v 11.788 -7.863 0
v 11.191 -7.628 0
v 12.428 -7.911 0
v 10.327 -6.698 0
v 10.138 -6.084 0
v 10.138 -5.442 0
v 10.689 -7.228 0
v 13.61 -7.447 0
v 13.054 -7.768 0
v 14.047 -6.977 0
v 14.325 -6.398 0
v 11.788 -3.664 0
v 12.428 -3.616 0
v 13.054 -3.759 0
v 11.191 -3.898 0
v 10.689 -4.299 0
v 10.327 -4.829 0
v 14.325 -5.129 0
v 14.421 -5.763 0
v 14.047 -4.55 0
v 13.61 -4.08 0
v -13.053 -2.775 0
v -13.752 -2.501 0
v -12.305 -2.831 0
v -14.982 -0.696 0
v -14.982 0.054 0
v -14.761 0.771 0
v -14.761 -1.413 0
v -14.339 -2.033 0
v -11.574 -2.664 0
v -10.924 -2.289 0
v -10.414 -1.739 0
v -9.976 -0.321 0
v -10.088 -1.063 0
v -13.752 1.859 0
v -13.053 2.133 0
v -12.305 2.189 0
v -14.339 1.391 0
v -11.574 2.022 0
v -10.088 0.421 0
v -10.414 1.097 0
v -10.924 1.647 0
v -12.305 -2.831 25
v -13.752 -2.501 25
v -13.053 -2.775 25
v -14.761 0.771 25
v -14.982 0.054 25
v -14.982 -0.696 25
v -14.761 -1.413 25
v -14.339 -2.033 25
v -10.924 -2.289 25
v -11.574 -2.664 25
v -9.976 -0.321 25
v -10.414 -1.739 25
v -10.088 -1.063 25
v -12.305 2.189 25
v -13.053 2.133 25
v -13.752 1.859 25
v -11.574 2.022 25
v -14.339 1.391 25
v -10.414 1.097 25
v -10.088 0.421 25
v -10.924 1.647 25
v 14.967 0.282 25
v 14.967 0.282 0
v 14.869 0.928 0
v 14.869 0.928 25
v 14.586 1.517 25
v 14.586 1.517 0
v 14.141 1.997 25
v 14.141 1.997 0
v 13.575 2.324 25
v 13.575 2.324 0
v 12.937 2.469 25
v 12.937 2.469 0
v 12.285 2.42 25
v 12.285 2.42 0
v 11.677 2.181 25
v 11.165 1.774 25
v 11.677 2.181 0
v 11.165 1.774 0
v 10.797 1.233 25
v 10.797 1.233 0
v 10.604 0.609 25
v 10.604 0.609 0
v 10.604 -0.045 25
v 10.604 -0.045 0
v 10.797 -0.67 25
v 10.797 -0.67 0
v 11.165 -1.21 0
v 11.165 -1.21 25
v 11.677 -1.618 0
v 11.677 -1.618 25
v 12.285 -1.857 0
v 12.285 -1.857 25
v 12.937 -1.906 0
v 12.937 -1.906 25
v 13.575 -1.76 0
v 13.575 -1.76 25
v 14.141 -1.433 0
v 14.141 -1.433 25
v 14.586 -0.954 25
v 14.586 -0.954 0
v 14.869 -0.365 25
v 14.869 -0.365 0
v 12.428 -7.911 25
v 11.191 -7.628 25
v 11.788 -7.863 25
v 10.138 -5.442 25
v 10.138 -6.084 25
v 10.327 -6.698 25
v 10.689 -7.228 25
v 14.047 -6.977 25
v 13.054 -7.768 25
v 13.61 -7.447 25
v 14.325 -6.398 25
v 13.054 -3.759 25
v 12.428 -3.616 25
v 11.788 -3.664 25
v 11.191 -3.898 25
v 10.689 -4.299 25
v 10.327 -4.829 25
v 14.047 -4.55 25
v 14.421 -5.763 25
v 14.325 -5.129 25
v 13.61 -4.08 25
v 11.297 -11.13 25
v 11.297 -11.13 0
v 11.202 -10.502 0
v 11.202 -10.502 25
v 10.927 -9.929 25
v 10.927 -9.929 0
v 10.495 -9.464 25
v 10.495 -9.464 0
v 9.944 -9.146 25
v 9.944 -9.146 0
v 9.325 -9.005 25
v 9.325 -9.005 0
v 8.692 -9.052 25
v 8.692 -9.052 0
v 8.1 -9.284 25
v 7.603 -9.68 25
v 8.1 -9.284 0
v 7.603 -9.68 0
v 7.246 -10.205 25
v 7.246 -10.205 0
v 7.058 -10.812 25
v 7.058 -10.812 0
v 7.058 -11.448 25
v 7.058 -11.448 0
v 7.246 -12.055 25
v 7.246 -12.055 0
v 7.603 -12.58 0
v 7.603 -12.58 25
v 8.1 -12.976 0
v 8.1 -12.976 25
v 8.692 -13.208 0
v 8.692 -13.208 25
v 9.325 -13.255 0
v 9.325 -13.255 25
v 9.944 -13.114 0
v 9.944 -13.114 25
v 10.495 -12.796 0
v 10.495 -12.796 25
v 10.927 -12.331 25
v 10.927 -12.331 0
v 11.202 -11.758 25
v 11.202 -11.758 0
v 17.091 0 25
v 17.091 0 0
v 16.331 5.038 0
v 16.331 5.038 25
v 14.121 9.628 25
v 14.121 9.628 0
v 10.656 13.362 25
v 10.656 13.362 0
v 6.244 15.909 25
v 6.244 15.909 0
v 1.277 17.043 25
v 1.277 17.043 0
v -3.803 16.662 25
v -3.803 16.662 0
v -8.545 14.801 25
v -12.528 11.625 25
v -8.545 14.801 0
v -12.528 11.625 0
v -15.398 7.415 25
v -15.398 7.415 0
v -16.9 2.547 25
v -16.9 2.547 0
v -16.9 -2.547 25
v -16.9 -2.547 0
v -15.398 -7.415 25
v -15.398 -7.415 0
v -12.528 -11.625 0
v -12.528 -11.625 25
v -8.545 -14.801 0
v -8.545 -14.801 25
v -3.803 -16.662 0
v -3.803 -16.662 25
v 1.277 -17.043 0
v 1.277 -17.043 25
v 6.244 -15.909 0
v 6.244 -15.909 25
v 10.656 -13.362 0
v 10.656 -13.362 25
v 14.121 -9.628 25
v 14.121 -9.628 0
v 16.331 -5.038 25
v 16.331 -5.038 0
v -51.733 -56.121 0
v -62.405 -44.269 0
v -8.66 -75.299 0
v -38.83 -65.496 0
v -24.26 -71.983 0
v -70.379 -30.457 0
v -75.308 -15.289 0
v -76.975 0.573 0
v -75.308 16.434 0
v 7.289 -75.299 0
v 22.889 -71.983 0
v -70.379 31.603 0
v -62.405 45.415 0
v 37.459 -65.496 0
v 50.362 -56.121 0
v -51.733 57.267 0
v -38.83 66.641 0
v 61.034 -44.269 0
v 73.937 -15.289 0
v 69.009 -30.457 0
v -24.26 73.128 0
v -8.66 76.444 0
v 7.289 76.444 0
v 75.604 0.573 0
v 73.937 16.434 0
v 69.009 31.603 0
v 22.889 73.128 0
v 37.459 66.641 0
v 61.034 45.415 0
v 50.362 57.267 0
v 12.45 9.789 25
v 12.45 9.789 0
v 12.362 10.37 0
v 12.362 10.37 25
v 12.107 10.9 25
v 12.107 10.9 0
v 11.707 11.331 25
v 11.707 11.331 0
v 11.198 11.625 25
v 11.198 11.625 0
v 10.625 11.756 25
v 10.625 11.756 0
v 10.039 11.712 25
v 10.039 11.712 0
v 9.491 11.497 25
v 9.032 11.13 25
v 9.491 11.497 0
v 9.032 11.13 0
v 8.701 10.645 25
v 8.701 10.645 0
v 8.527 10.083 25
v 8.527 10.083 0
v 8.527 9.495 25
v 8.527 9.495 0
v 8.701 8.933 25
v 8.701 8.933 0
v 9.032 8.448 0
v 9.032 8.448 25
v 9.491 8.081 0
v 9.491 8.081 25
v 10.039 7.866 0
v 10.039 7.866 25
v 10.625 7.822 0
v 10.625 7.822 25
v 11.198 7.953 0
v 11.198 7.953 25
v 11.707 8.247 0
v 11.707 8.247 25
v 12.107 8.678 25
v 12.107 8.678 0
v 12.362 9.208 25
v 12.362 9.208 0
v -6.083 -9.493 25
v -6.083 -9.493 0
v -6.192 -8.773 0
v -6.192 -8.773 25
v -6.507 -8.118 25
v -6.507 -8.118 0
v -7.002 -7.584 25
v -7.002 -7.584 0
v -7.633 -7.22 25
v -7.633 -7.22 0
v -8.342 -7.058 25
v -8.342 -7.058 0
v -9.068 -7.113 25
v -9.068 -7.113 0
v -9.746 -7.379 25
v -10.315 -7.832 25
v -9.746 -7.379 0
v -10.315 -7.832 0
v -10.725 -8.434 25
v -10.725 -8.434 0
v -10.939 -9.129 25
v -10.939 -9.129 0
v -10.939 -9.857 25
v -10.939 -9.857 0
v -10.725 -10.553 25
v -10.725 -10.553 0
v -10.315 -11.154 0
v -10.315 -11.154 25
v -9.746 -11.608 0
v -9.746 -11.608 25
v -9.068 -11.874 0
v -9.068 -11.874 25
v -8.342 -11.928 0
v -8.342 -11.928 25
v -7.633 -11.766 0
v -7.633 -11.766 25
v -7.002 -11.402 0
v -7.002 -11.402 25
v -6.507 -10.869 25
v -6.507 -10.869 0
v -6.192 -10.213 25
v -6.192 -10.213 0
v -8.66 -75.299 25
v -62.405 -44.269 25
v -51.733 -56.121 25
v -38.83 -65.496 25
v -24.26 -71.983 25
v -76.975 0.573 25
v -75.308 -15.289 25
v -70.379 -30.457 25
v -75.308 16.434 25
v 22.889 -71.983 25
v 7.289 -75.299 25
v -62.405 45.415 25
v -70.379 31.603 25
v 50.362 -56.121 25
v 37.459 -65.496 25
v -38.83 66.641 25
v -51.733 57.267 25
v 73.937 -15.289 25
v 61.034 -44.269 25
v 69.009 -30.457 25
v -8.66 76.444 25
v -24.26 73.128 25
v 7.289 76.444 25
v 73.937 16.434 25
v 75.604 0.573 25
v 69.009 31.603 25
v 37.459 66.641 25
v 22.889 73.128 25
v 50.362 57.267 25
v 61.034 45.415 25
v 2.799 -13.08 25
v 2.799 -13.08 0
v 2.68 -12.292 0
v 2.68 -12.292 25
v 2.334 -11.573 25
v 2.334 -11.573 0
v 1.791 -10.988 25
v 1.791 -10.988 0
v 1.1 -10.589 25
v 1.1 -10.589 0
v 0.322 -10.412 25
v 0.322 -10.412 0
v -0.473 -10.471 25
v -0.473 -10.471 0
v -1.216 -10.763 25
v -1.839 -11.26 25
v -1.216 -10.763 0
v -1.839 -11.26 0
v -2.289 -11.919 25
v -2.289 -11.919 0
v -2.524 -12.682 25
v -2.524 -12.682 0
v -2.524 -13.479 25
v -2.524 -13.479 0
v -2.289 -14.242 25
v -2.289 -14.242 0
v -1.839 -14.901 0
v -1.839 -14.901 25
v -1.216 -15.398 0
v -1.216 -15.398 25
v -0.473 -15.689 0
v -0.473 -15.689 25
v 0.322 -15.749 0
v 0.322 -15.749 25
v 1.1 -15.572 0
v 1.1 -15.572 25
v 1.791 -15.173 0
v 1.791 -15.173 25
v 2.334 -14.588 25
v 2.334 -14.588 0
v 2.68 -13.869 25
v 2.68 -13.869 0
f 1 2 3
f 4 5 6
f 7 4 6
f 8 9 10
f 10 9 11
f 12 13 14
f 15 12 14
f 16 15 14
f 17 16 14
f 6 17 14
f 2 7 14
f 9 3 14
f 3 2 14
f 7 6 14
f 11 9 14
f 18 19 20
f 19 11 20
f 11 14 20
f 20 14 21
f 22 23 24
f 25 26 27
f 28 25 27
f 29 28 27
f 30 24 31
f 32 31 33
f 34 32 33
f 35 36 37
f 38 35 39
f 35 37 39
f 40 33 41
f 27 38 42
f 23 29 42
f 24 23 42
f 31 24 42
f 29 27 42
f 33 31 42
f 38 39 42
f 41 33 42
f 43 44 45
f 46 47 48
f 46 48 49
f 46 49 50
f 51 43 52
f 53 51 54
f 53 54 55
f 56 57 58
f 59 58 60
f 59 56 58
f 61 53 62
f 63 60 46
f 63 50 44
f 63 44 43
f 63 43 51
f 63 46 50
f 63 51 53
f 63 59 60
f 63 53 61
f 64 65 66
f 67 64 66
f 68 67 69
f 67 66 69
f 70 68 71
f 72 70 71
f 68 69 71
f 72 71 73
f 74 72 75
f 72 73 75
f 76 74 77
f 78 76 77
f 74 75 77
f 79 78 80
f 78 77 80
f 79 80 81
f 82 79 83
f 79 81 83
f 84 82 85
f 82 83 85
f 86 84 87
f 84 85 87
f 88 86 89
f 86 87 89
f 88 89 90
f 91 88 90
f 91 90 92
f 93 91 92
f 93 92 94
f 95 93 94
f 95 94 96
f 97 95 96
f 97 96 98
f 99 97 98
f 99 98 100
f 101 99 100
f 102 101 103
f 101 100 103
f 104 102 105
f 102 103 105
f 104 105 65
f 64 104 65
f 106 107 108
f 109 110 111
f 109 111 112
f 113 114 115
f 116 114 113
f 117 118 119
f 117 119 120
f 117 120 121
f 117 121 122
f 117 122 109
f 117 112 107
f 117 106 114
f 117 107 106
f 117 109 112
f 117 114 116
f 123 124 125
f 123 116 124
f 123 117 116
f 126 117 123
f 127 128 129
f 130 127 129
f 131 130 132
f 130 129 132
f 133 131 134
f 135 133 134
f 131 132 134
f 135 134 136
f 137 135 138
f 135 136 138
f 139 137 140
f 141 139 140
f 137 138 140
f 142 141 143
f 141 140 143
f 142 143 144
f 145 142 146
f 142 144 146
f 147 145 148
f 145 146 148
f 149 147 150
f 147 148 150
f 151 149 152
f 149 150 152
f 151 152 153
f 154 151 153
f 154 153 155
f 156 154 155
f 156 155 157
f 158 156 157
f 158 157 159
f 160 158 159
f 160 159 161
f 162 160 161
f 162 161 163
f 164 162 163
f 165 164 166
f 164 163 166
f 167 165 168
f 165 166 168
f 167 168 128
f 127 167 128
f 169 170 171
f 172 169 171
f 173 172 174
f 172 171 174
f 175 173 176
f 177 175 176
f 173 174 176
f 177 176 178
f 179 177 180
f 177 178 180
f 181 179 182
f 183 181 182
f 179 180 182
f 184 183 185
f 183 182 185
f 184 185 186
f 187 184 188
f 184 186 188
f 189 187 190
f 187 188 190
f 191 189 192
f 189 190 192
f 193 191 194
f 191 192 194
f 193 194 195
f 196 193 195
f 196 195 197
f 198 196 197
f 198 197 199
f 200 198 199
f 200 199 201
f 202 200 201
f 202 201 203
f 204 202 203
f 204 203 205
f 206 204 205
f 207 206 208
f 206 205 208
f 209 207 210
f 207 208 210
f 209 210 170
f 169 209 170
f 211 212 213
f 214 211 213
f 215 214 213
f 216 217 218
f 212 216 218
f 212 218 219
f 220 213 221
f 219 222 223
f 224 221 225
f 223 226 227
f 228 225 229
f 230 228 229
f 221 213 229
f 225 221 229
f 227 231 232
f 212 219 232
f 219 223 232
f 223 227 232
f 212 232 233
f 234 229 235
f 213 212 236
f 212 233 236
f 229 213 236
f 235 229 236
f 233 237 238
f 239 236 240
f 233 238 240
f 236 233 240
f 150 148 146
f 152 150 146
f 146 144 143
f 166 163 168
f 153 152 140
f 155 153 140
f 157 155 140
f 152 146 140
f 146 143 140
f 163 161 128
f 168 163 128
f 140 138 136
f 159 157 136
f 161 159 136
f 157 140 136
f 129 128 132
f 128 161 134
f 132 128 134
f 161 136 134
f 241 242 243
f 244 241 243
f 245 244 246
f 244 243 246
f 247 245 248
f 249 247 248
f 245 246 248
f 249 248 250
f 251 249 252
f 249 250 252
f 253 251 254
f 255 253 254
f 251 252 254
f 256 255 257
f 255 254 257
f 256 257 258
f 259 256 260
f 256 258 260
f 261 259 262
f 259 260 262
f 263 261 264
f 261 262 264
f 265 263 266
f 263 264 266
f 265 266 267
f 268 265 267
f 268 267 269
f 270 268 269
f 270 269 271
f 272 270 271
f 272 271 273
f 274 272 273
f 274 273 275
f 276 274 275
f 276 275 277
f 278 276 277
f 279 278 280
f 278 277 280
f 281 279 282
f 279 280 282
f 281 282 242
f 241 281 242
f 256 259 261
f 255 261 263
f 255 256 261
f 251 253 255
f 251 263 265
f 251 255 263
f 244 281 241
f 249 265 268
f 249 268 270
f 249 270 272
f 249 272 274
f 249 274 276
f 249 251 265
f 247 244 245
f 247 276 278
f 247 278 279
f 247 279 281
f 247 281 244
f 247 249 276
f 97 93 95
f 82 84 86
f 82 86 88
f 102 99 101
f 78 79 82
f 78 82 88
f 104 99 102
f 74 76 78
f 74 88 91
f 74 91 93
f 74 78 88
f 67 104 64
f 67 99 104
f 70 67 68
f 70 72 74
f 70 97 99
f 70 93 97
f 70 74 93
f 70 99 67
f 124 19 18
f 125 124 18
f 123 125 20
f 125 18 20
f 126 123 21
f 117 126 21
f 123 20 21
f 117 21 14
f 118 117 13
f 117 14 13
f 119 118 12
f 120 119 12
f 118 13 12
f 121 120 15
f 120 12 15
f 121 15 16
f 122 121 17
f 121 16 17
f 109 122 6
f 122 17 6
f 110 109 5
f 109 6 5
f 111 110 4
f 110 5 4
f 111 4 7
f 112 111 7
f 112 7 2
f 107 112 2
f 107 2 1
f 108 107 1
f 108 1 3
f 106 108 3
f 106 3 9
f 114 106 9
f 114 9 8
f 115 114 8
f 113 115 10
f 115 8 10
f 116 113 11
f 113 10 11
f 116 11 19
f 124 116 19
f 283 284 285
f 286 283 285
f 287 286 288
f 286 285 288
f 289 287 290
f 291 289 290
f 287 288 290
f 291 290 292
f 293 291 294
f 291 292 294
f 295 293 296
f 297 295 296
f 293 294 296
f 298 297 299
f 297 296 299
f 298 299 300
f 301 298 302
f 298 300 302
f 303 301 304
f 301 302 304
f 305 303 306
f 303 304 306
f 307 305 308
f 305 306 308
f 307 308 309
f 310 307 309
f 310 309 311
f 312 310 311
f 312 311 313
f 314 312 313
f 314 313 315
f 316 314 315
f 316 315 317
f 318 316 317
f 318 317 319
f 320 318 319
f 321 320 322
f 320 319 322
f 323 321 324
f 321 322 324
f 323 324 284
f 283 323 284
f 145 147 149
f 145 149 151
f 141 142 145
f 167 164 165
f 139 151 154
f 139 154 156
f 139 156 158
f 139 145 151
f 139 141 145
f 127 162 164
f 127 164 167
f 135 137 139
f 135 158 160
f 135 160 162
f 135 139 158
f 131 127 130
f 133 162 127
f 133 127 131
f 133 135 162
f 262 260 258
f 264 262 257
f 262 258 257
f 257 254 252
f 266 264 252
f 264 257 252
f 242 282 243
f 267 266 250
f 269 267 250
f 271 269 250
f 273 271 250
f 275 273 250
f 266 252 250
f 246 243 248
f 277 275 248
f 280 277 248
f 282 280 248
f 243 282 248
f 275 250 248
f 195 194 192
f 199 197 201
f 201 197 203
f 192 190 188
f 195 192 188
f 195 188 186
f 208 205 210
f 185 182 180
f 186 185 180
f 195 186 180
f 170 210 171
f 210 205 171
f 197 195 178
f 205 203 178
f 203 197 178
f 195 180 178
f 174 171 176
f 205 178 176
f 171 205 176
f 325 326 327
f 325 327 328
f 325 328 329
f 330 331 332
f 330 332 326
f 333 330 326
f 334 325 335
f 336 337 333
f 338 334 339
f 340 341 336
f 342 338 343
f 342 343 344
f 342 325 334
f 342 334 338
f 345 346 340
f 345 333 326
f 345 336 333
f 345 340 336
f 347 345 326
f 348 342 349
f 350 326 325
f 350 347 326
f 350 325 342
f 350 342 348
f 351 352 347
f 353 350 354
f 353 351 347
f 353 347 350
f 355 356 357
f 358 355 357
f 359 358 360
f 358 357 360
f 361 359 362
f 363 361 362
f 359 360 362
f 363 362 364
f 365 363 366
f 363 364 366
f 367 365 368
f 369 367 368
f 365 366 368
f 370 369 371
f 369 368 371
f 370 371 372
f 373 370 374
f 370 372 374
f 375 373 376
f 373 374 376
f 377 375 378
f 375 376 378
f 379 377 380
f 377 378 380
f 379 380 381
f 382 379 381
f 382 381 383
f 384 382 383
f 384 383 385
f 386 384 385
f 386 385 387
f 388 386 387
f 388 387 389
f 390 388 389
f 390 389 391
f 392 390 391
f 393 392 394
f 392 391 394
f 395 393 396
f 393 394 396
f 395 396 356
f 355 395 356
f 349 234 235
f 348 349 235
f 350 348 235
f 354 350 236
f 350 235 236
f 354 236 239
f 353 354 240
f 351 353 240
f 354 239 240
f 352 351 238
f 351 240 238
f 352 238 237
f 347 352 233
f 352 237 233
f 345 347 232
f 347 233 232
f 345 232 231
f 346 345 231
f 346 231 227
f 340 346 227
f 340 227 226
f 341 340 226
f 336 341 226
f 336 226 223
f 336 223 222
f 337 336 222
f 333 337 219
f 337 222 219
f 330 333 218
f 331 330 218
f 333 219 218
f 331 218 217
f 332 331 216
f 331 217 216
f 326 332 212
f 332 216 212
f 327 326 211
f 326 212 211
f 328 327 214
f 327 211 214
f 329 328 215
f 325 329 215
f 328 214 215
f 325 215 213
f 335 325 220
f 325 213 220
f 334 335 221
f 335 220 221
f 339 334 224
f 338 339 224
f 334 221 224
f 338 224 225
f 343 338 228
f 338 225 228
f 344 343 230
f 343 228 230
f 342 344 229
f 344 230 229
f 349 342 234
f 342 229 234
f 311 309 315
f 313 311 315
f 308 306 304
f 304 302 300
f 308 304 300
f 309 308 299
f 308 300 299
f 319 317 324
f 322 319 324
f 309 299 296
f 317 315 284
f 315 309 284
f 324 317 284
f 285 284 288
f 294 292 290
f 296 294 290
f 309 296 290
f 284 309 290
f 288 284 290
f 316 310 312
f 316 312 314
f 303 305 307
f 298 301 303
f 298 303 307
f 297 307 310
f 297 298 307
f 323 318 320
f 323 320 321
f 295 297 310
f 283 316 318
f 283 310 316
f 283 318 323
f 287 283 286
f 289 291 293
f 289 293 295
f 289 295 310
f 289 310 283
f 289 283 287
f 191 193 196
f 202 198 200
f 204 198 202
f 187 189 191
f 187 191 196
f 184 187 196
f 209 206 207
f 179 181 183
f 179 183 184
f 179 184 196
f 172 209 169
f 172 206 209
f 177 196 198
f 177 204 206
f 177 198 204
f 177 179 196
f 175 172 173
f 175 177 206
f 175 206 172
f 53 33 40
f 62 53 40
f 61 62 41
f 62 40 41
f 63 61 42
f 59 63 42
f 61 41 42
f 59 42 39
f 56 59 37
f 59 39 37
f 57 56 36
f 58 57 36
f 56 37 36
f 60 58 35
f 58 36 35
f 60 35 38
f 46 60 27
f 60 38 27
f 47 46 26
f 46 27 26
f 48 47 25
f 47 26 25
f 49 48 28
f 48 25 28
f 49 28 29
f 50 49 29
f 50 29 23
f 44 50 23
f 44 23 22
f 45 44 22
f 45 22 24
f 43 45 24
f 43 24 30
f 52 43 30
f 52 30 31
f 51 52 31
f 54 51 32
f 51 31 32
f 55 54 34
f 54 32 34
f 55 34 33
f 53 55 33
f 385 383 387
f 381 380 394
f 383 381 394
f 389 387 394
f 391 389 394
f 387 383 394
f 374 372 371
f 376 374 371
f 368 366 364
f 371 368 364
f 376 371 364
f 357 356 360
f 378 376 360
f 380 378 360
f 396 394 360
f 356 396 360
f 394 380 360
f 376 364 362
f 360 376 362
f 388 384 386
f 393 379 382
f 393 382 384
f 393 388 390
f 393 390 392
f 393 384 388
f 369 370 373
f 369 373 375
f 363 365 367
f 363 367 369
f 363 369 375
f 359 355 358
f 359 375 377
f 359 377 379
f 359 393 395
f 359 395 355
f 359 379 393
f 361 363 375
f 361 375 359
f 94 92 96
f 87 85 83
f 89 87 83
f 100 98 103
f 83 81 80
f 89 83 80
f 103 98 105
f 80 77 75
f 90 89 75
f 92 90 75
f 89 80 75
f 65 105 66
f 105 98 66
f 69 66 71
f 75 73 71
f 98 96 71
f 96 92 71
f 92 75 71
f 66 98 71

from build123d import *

# Parameters (mm, degrees)
F5_R      = 1.972161
F5_R_2    = 2.517133
F5_R_3    = 2.441644
F5_R_4    = 2.676168
F5_R_5    = 2.131362
F5_R_6    = 2.153626
F5_R_7    = 2.193513
F7_DEPTH  = 25
F0_R      = 17.090708
F8_DEPTH  = 25
F3_R      = 2.330899
F9_DEPTH  = 25
F4_R      = 2.406581
F10_DEPTH = 25
F6_R      = 76.289464
F11_DEPTH = 25


with BuildPart() as f7:
    # F5 (on Top) → F7 (new body)
    with BuildSketch(Plane.XY):
        with Locations((10.47738, 9.788939)):
            Circle(F5_R)
        with Locations((-12.493374, -0.321115)):
            Circle(F5_R_2)
        with Locations((-8.524761, -9.493174)):
            Circle(F5_R_3)
        with Locations((0.12246, -13.080394)):
            Circle(F5_R_4)
        with Locations((9.165824, -11.129929)):
            Circle(F5_R_5)
        with Locations((12.26739, -5.763358)):
            Circle(F5_R_6)
        with Locations((12.773341, 0.28163)):
            Circle(F5_R_7)
    extrude(amount=F7_DEPTH)


with BuildPart() as f8:
    # F0 (on Top) → F8 (new body)
    with BuildSketch(Plane.XY):
        Circle(F0_R)
    extrude(amount=F8_DEPTH)

    # F3 (on face) → F9 (join)
    with BuildSketch(Plane.XY):
        with Locations((-10.025119, 9.261301)):
            Circle(F3_R)
    extrude(amount=F9_DEPTH)

    # F4 (on face) → F10 (join)
    with BuildSketch(Plane.XY):
        with Locations((0.306891, 11.839189)):
            Circle(F4_R)
    extrude(amount=F10_DEPTH)


with BuildPart() as f11:
    # F6 (on Top) → F11 (new body)
    with BuildSketch(Plane.XY):
        with Locations((-0.68526, 0.572864)):
            Circle(F6_R)
    extrude(amount=F11_DEPTH)


solid = Compound([f7.part, f8.part, f11.part])
